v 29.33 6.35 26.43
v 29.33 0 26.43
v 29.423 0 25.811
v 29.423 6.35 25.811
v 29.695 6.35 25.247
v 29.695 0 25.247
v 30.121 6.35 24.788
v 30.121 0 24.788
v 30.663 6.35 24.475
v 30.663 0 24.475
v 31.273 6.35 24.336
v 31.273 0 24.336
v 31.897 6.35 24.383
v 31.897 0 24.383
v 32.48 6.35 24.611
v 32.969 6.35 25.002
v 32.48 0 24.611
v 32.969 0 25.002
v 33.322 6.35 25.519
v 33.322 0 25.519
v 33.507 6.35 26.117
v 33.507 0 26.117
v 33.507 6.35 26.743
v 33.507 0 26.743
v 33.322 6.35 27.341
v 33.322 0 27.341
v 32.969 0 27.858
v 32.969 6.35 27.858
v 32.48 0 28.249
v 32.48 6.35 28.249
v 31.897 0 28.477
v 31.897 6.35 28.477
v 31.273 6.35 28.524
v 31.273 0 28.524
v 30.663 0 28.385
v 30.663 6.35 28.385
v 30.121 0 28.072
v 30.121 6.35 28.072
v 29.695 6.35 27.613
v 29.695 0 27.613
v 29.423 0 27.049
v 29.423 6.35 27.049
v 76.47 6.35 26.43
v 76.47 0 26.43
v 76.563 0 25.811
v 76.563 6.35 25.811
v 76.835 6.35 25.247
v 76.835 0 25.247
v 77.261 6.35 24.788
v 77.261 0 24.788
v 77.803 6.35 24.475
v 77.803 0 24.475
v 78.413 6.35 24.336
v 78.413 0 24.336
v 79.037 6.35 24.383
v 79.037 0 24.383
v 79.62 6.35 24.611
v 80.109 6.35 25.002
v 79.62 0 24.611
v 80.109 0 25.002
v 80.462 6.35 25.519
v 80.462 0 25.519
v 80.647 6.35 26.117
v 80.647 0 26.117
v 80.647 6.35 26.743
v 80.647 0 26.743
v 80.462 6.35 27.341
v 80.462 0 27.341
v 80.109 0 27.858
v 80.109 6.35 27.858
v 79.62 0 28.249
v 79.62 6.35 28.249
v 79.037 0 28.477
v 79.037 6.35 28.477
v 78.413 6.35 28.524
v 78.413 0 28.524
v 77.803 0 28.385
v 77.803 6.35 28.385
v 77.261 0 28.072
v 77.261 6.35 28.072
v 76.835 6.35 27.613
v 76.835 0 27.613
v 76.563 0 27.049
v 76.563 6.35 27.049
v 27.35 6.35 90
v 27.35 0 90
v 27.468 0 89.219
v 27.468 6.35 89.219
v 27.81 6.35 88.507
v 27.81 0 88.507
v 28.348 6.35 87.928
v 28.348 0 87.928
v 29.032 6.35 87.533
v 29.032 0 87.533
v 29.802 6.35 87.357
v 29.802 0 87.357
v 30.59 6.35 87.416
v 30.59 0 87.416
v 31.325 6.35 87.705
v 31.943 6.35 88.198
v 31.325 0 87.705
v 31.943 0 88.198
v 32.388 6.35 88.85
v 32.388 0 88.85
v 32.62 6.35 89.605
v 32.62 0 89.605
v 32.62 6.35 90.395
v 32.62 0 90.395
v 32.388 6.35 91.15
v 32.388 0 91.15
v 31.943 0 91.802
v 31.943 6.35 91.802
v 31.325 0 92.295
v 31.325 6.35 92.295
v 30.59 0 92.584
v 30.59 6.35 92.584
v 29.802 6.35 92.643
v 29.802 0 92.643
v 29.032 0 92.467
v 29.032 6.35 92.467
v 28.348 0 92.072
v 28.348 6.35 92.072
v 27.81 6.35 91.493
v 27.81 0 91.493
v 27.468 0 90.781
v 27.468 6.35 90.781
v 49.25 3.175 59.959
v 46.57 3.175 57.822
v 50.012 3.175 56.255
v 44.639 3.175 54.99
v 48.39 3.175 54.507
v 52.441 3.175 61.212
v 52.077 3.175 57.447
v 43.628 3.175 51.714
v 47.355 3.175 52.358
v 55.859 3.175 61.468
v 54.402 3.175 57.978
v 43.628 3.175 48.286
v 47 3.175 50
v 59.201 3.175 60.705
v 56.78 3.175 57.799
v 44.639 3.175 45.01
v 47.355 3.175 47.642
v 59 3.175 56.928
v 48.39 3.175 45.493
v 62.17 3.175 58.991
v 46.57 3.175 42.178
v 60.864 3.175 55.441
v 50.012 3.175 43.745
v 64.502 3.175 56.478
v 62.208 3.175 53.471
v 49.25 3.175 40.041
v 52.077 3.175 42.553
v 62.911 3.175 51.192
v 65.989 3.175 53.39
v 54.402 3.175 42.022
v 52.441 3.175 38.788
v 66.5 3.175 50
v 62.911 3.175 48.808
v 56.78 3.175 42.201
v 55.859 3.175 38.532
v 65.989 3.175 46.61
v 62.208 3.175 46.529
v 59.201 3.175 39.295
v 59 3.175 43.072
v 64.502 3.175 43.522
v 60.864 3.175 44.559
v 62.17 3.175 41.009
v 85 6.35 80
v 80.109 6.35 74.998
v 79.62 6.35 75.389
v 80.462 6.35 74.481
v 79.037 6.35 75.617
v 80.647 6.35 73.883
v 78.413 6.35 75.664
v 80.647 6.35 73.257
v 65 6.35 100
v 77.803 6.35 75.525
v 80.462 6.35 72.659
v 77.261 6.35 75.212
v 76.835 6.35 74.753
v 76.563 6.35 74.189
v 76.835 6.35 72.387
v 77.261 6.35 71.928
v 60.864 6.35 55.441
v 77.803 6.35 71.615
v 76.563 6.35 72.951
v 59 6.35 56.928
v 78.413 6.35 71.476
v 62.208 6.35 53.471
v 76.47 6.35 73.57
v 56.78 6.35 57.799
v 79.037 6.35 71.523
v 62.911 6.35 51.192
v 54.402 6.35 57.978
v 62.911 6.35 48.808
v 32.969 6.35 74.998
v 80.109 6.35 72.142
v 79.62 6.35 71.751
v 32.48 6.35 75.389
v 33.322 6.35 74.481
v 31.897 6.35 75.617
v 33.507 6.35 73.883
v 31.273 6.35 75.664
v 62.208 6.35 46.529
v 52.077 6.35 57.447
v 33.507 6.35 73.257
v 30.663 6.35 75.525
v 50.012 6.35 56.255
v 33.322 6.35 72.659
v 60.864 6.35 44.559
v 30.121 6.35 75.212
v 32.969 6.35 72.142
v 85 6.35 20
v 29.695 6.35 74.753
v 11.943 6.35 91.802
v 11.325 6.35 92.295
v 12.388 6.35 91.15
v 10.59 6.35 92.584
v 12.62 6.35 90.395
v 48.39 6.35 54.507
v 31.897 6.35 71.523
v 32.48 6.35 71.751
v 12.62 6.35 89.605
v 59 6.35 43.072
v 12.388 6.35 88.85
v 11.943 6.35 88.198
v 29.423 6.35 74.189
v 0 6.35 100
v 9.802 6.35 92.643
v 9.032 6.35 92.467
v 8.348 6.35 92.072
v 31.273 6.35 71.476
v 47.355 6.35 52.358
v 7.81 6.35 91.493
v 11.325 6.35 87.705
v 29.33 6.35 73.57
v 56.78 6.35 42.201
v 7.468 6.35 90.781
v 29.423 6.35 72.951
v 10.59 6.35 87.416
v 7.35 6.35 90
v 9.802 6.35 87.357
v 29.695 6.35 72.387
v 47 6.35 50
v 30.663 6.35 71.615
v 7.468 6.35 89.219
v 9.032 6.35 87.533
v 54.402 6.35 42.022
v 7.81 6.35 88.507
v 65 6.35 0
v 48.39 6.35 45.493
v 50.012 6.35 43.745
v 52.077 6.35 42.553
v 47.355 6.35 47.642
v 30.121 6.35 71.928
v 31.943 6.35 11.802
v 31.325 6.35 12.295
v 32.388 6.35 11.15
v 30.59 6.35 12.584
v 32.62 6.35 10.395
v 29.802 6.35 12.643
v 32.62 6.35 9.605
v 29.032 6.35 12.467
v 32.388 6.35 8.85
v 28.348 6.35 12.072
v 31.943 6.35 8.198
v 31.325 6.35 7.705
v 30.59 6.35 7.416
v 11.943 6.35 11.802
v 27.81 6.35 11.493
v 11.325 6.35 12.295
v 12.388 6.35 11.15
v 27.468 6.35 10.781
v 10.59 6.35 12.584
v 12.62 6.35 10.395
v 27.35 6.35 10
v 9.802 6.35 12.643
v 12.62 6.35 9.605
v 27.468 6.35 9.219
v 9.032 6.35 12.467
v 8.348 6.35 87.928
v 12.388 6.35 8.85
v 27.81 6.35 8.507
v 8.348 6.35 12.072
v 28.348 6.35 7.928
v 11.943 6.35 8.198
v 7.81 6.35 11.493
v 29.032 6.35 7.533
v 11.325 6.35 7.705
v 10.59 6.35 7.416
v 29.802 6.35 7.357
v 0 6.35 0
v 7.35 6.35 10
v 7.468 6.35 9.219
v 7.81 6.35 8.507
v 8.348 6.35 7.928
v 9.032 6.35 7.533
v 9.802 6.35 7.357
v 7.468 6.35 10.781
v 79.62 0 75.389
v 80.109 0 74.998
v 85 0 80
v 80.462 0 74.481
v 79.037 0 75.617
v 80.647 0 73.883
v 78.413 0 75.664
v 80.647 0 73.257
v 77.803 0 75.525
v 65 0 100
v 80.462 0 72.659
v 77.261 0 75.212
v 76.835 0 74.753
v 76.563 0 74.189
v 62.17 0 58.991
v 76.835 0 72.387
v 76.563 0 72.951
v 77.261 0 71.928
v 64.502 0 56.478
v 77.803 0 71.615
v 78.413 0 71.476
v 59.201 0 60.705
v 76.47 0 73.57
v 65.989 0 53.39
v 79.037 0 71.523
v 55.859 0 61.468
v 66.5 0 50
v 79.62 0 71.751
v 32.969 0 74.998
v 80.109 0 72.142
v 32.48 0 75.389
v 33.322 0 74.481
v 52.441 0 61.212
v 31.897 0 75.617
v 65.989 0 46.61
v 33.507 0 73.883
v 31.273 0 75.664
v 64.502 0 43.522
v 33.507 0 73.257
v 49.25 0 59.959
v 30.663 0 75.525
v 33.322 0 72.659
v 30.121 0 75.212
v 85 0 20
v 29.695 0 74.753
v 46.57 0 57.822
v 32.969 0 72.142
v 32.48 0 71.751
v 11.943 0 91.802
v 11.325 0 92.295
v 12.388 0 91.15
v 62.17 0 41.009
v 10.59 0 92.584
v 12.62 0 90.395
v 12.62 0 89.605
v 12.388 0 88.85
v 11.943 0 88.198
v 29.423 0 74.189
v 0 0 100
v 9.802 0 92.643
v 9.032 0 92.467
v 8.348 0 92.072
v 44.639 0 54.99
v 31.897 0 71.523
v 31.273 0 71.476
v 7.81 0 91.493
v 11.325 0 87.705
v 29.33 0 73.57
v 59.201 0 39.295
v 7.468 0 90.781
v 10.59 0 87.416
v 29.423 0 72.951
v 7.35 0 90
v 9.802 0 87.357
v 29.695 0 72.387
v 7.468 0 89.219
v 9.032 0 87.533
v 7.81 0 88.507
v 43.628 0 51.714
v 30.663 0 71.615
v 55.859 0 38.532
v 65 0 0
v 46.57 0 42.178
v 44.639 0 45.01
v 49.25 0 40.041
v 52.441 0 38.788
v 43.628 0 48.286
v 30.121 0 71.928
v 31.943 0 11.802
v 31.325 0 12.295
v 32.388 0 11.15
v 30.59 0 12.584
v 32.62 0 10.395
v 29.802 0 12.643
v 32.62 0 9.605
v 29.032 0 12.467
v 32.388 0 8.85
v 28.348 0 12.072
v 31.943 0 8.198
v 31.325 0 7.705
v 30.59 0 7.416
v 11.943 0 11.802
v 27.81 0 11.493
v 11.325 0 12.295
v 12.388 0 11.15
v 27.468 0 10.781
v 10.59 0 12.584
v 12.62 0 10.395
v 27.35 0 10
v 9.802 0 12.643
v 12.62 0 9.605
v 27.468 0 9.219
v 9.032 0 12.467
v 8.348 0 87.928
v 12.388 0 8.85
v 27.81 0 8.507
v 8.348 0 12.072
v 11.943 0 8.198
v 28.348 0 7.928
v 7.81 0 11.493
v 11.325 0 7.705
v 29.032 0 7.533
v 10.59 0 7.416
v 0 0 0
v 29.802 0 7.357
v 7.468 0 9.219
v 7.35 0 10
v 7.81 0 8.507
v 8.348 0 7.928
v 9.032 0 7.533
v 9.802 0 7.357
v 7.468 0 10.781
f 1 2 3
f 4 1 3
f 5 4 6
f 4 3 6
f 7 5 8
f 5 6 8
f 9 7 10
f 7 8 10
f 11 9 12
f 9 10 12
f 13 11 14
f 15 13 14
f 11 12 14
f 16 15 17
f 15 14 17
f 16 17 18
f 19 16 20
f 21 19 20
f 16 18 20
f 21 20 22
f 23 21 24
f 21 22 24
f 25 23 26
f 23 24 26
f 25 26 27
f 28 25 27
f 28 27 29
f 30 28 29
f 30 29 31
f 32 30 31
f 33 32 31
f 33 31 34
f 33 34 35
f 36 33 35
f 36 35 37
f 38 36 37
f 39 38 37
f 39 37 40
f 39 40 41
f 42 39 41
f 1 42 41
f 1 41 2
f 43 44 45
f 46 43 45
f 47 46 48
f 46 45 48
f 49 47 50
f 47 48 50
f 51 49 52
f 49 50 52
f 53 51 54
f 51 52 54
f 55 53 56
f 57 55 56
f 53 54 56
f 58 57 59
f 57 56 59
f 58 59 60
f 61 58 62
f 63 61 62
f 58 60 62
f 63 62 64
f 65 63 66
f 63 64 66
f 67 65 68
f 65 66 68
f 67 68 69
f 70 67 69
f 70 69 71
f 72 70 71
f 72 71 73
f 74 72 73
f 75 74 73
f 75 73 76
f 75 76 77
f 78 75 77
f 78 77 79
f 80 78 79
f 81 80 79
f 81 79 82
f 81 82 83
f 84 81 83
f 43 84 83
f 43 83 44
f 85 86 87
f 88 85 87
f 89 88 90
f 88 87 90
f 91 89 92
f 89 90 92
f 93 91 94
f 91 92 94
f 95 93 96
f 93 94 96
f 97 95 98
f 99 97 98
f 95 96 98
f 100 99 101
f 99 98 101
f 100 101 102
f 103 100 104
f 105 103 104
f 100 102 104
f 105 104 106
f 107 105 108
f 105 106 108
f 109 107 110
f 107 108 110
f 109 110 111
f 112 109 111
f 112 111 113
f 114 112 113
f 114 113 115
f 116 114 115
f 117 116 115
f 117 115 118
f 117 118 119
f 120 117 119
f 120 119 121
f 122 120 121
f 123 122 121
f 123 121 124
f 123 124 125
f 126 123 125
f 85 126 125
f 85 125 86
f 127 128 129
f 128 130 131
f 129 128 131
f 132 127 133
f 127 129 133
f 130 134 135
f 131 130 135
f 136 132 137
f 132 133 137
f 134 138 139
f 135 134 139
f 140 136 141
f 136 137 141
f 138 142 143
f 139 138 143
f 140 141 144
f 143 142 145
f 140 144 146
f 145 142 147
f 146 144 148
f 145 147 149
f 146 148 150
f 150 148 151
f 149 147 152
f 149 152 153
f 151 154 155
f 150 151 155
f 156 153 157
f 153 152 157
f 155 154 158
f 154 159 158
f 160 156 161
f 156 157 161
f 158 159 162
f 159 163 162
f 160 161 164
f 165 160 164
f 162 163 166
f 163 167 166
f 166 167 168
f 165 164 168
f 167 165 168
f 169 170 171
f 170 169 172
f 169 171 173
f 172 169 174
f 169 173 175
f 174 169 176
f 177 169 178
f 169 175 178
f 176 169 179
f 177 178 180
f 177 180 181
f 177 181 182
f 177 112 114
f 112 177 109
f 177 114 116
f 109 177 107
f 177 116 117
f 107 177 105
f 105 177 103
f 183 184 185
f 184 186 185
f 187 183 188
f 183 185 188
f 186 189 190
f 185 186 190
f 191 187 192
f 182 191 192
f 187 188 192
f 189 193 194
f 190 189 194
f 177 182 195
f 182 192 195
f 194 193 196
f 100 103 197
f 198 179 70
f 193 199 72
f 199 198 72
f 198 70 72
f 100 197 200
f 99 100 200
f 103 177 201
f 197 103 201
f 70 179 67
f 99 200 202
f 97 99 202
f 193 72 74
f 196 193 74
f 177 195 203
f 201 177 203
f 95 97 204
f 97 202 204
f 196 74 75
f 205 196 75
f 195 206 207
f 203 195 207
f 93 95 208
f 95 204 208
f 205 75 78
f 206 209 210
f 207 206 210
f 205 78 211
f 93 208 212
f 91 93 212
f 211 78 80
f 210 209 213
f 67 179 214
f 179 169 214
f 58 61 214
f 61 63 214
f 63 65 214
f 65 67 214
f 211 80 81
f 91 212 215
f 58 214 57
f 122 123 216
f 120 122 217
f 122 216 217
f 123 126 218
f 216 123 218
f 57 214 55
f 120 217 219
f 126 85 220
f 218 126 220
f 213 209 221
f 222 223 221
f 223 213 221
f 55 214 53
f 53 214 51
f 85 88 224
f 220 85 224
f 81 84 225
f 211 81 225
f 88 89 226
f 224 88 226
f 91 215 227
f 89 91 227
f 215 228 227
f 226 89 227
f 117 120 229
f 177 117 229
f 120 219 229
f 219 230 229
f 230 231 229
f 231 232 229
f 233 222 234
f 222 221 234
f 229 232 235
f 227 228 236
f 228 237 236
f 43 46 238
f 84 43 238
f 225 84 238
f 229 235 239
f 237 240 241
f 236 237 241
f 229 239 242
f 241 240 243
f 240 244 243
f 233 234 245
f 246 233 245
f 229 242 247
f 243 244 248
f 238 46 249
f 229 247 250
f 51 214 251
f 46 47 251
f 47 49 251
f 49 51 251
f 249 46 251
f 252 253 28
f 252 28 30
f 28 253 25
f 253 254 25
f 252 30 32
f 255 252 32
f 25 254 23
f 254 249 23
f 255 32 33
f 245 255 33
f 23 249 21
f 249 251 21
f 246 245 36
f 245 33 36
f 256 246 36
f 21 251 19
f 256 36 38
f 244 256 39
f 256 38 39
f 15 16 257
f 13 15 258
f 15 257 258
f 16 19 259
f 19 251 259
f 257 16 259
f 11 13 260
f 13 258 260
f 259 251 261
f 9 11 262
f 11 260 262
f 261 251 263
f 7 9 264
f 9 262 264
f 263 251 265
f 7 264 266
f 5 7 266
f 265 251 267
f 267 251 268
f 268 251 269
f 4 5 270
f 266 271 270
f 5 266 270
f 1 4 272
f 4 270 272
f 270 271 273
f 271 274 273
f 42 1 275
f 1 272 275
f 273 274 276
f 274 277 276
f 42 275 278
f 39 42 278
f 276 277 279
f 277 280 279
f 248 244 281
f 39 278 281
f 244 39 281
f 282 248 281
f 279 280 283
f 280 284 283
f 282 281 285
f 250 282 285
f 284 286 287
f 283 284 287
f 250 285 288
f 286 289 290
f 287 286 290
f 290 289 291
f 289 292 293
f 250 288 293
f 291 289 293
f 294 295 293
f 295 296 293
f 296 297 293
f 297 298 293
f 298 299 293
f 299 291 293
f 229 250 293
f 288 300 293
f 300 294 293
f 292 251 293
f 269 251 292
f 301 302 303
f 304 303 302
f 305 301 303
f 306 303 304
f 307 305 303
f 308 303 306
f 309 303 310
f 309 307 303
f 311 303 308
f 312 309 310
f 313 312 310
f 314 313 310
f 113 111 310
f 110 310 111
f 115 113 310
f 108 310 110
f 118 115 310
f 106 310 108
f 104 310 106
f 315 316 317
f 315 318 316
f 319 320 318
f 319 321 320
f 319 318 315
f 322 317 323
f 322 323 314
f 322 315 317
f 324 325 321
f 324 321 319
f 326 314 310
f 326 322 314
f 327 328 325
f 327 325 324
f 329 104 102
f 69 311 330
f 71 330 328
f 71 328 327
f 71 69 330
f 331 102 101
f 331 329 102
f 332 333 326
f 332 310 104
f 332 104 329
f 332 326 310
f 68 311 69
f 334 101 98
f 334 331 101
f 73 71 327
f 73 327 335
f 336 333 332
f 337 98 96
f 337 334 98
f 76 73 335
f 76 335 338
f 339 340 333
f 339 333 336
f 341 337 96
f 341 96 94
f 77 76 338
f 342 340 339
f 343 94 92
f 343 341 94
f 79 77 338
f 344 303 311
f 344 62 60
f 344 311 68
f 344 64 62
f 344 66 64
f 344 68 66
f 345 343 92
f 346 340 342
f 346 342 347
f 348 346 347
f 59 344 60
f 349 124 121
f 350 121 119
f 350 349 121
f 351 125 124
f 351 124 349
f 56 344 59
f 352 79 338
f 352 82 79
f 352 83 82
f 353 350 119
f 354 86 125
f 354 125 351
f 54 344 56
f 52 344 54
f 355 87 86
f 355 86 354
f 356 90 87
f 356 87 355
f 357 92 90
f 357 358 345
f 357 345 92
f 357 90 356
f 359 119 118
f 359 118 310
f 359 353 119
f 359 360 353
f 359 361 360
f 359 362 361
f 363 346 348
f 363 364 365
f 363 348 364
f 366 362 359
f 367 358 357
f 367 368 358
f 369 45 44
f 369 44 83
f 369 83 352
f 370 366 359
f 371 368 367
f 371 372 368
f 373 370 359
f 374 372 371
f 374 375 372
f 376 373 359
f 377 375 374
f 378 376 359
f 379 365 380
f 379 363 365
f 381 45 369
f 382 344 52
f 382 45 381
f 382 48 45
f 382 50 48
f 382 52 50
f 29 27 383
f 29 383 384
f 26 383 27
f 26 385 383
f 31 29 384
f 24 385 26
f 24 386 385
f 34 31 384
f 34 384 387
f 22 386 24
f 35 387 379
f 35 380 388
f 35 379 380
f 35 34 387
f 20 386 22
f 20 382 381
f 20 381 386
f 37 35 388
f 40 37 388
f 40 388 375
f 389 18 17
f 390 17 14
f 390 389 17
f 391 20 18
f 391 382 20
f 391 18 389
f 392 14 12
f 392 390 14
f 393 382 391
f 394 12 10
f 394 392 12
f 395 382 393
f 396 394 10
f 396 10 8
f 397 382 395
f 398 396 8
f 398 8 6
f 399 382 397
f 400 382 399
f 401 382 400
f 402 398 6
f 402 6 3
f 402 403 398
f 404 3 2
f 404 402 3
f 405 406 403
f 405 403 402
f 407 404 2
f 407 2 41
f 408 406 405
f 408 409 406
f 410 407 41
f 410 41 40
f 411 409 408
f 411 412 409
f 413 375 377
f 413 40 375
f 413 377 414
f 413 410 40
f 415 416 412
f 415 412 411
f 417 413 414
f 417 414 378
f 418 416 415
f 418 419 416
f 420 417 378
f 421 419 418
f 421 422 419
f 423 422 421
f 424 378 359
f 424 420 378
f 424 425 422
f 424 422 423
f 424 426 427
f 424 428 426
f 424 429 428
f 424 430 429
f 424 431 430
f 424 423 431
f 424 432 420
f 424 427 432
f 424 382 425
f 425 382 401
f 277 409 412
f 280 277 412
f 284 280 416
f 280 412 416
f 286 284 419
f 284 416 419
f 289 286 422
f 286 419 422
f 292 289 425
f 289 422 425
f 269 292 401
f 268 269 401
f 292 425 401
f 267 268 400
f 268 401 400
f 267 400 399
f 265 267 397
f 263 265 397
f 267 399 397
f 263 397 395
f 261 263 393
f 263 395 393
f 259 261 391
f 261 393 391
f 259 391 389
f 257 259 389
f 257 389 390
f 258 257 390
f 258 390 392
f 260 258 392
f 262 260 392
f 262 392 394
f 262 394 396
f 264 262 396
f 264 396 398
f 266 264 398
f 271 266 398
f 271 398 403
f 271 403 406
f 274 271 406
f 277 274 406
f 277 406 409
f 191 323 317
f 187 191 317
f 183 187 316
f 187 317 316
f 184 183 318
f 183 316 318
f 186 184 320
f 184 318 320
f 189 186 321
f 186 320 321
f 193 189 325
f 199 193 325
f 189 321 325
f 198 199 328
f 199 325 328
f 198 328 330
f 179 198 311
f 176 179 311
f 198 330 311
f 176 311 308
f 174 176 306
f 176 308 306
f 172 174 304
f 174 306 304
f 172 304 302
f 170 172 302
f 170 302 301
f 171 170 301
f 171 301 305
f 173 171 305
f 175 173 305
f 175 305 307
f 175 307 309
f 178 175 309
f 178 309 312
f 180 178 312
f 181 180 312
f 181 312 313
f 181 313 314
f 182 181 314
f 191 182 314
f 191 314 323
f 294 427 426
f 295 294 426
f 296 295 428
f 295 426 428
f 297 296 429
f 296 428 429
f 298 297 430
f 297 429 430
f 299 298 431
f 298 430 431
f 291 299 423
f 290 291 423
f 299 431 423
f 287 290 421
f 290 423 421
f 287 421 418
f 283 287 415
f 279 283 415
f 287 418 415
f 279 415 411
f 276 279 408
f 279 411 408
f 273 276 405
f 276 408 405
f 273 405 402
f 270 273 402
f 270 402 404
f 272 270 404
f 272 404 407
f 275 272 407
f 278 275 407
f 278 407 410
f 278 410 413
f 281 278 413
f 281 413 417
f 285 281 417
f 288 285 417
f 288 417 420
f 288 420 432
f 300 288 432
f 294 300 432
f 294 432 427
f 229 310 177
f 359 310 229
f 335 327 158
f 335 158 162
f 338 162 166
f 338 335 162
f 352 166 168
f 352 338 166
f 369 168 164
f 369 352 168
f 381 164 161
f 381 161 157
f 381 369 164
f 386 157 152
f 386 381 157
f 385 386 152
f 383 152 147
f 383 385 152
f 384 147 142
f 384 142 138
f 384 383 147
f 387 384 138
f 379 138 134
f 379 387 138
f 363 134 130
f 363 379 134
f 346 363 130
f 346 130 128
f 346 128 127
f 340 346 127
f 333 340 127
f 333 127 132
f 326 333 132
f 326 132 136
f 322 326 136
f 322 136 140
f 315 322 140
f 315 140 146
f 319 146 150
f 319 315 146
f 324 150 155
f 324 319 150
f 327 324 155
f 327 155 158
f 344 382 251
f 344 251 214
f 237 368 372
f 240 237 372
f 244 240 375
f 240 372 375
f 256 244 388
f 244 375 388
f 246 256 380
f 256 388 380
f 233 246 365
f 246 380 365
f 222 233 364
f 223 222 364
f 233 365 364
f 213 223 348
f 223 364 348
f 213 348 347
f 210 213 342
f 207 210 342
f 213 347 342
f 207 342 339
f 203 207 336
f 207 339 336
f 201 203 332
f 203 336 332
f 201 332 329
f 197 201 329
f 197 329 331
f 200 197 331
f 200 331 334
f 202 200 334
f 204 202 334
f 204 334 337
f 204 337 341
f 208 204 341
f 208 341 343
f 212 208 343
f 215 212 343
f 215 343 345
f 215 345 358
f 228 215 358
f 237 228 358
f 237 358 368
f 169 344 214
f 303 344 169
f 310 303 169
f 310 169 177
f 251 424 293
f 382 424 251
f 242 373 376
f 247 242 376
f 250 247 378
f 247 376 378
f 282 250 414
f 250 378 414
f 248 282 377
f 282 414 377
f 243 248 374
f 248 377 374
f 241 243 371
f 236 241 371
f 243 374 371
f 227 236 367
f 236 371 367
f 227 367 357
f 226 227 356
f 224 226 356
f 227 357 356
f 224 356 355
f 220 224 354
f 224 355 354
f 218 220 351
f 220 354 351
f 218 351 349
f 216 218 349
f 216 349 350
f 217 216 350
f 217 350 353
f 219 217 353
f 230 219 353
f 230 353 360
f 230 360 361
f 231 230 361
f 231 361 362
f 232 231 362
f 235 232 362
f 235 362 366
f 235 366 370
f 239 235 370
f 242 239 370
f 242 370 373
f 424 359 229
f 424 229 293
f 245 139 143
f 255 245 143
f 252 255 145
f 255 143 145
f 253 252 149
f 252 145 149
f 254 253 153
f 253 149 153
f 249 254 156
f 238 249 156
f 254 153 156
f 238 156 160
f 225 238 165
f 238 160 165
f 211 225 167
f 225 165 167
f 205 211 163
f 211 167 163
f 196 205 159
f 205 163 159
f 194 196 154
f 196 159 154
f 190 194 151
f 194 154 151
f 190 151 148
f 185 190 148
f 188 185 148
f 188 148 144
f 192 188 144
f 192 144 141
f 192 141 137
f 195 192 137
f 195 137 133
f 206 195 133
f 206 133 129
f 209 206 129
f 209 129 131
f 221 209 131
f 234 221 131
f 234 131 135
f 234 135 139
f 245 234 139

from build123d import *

# Parameters (mm, degrees)
BOSS_EXTRUDE1_DEPTH   = 6.35
M5X0_8_TAPPED_HOLE1_D = 4.2
M5_CLEARANCE_HOLE1_D  = 5.3
SKETCH6_R             = 11.5
CUT_EXTRUDE1_DEPTH    = 3.175
SKETCH7_R             = 8
CUT_EXTRUDE2_DEPTH    = 10


with BuildPart() as part:
    # Sketch1 → Boss-Extrude1 (new body)
    with BuildSketch(Plane(origin=(0, 0, 0), x_dir=(1, 0, 0), z_dir=(0, 1, 0))):
        Polygon((0, 0), (65, 0), (85, -20), (85, -80), (65, -100), (0, -100), align=None)
    extrude(amount=BOSS_EXTRUDE1_DEPTH)

    # M5x0.8 Tapped Hole1 (through all)
    with Locations(Plane(origin=(0, 6.35, 0), x_dir=(1, 0, 0), z_dir=(0, 1, 0))):
        with Locations((78.57, -26.43), (31.43, -26.43), (31.43, -73.57), (78.57, -73.57)):
            Hole(M5X0_8_TAPPED_HOLE1_D / 2)

    # M5 Clearance Hole1 (through all)
    with Locations(Plane(origin=(0, 6.35, 0), x_dir=(1, 0, 0), z_dir=(0, 1, 0))):
        with Locations((10, -10), (30, -10), (10, -90), (30, -90)):
            Hole(M5_CLEARANCE_HOLE1_D / 2)

    # Sketch6 → Cut-Extrude1 (cut)
    with BuildSketch(Plane(origin=(0, 0, 0), x_dir=(1, 0, 0), z_dir=(0, 1, 0))):
        with Locations((55, -50)):
            Circle(SKETCH6_R)
    extrude(amount=CUT_EXTRUDE1_DEPTH, mode=Mode.SUBTRACT)

    # Sketch7 → Cut-Extrude2 (cut)
    with BuildSketch(Plane(origin=(0, 3.175, 0), x_dir=(-1, 0, 0), z_dir=(0, -1, 0))):
        with Locations((-55, -50)):
            Circle(SKETCH7_R)
    extrude(amount=-CUT_EXTRUDE2_DEPTH, mode=Mode.SUBTRACT)


solid = part.part
